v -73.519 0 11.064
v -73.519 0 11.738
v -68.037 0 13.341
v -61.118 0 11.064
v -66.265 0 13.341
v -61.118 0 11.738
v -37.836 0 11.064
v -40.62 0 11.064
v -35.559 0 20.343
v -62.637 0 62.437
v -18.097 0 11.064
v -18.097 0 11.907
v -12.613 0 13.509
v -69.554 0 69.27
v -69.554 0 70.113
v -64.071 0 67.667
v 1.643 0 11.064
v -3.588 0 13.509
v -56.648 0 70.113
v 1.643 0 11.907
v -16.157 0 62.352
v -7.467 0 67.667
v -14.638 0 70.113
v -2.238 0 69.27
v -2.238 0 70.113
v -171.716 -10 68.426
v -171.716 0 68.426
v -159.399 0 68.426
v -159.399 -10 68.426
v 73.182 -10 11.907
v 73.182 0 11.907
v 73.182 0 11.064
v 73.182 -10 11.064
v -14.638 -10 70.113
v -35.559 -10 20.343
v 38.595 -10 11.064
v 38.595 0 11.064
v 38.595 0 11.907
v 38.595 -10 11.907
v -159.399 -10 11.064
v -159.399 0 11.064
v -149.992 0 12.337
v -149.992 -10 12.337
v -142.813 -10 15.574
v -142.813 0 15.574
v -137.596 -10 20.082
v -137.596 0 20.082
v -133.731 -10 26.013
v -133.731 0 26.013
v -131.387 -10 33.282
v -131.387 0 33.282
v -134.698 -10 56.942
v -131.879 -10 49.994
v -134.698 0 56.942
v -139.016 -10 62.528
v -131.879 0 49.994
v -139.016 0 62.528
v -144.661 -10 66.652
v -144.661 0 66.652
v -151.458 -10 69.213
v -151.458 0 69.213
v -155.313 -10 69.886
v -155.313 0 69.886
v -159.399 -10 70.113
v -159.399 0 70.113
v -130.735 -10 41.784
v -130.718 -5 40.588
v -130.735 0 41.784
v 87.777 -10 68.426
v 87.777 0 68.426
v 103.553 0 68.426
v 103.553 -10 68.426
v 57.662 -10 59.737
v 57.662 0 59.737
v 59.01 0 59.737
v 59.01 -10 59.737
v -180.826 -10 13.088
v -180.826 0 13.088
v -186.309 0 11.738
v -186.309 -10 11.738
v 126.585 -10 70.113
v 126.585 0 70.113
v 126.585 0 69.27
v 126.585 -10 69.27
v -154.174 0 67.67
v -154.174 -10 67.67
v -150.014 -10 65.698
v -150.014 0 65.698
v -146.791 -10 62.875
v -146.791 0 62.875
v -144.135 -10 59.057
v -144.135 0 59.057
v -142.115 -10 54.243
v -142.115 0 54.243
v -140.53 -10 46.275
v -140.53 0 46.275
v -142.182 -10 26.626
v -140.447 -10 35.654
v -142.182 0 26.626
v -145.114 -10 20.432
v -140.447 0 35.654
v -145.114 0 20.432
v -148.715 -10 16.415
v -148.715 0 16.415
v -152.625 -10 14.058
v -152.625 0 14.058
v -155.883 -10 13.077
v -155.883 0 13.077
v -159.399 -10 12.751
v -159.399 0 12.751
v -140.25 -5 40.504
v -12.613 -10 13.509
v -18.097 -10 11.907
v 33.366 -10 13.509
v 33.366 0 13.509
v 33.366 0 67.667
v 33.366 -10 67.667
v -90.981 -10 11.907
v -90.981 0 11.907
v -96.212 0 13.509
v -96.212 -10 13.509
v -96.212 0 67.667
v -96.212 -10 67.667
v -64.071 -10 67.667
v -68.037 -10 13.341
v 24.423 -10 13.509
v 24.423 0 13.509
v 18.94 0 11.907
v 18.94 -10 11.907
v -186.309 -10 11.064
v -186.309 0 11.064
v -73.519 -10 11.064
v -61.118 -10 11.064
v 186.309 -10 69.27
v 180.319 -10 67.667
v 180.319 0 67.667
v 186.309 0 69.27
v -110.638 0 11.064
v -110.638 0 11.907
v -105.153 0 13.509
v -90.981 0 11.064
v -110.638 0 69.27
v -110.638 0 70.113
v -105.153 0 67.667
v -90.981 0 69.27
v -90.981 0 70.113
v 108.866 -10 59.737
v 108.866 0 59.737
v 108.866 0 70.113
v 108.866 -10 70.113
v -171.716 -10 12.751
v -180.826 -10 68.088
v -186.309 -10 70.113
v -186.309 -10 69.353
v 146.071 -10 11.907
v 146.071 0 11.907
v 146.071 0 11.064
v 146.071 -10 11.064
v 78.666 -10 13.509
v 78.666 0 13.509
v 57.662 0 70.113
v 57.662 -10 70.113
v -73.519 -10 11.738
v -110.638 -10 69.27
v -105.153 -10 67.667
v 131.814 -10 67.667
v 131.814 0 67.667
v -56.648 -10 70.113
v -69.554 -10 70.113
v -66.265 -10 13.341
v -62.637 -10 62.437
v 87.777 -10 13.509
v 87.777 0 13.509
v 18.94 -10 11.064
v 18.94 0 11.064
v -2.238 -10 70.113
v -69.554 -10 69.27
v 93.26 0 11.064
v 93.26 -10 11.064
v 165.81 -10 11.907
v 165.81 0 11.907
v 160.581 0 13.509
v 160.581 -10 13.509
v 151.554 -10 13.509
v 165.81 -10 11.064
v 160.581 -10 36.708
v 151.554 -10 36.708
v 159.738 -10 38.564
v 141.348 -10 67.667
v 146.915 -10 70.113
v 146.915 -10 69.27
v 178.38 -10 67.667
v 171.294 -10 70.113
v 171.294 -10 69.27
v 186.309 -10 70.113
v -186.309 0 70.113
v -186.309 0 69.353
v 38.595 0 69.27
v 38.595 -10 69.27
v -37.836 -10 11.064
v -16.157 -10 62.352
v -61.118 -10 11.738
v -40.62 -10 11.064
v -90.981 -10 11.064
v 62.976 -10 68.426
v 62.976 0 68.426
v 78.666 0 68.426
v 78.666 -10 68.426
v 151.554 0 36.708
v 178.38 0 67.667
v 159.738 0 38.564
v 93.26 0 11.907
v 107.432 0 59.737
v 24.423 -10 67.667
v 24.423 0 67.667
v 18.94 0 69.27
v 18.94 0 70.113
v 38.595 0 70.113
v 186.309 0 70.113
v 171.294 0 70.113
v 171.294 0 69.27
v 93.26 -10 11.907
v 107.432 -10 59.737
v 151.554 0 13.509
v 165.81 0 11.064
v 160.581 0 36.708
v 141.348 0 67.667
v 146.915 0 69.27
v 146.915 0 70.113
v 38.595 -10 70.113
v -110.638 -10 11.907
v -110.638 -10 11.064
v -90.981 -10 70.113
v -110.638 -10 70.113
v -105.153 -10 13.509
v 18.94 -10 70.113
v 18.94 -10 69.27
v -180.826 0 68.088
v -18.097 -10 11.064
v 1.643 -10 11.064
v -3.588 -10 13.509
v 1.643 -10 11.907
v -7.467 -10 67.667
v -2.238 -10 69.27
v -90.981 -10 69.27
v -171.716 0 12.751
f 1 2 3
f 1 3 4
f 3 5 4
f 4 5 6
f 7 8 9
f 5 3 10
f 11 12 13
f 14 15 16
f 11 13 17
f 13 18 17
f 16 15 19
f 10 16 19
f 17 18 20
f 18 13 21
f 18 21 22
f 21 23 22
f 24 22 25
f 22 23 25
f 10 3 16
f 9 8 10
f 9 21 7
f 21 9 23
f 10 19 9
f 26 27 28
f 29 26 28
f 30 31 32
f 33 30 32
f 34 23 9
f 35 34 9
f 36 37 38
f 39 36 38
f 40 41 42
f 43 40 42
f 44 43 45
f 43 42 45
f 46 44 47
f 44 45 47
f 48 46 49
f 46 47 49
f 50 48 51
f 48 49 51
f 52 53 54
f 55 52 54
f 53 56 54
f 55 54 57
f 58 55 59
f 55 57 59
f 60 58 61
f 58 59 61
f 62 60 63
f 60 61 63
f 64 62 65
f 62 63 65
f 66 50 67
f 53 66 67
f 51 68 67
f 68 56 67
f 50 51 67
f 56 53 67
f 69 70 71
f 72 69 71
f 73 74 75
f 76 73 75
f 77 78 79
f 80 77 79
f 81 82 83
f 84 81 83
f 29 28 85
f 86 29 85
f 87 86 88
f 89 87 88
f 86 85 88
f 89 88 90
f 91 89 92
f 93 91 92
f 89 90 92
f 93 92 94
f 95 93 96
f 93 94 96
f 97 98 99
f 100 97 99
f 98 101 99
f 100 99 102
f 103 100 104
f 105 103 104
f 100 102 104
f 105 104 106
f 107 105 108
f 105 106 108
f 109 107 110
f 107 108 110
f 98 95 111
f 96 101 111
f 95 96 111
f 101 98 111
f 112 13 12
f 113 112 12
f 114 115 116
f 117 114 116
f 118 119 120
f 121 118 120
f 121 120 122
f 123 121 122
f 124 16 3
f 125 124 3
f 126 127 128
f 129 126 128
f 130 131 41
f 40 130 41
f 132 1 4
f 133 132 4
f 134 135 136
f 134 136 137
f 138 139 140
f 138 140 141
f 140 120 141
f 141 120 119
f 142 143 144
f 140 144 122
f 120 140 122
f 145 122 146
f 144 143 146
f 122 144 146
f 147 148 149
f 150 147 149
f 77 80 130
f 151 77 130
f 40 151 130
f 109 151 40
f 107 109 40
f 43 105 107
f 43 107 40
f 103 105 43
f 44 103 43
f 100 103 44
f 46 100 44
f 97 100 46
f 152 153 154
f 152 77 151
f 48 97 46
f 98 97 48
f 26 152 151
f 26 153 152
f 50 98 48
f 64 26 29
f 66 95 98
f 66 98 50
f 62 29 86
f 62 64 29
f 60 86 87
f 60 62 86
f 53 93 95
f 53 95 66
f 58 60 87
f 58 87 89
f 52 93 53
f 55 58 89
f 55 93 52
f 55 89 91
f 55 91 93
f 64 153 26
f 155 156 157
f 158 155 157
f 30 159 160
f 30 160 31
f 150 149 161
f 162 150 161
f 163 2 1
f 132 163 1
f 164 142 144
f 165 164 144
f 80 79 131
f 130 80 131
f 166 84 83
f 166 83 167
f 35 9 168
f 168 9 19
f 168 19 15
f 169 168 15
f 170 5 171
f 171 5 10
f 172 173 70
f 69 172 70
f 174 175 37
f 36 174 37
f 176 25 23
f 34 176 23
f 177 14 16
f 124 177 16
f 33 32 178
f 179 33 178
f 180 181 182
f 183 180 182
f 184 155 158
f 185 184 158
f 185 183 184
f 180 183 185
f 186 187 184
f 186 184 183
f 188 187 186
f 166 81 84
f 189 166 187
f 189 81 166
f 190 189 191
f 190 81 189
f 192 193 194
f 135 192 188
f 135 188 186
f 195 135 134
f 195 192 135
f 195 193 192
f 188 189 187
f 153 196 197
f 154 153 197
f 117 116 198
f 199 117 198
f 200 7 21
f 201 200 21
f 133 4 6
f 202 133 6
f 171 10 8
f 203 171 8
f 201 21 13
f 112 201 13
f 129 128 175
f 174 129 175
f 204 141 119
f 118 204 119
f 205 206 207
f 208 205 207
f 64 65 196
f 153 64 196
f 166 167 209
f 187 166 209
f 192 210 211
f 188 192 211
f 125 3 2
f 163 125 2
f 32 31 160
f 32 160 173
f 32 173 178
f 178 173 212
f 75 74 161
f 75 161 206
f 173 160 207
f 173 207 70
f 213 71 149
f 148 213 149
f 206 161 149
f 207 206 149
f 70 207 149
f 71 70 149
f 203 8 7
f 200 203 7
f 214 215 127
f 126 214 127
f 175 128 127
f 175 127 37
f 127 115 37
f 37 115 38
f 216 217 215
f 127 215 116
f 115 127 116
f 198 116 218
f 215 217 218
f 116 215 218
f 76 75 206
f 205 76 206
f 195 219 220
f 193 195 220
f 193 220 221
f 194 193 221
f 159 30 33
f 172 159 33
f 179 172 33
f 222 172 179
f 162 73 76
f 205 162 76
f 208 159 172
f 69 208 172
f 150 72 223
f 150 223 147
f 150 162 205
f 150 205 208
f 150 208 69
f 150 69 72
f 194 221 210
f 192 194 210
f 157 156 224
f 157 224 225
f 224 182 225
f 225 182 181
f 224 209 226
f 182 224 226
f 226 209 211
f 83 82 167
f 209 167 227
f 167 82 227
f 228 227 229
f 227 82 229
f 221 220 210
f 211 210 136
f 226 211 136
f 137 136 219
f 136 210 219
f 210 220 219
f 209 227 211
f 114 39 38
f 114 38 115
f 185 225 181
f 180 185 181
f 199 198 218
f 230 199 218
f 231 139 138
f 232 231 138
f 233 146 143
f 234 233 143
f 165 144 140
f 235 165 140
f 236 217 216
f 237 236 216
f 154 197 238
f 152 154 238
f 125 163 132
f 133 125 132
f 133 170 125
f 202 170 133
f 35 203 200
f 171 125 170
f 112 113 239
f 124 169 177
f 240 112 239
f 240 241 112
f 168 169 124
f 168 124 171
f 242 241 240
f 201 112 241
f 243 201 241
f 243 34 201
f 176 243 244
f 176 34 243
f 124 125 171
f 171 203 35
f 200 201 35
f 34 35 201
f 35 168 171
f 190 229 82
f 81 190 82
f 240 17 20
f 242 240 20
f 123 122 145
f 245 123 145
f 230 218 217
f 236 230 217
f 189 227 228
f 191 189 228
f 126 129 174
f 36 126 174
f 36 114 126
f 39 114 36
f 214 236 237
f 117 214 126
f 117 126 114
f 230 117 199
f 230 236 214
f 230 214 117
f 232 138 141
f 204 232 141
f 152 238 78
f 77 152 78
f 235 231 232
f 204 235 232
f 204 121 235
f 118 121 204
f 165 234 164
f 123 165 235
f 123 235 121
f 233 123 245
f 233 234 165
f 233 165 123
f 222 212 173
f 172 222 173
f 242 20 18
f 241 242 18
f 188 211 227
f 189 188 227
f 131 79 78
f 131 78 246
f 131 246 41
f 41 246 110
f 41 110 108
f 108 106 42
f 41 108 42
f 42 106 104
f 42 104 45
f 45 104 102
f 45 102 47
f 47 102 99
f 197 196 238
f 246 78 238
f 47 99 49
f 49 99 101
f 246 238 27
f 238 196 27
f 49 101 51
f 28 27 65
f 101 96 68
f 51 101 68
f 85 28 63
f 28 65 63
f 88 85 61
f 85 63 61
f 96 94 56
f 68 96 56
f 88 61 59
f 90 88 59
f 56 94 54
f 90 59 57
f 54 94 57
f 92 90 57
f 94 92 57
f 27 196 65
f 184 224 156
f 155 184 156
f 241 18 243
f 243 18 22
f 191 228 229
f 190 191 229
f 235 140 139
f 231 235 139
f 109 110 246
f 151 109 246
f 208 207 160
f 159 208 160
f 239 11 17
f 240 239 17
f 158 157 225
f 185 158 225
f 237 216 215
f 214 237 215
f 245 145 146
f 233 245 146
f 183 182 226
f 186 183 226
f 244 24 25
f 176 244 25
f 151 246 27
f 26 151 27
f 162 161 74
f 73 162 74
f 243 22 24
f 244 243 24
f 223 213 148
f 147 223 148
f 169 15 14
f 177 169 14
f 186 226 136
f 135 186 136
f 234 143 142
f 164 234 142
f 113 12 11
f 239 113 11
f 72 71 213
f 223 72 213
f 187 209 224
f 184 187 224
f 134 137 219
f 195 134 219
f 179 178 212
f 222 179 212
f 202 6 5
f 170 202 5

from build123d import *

# Parameters (mm, degrees)
F1_DEPTH = 10


with BuildPart() as f1:
    # F0 (on Front) → F1 (new body)
    with BuildSketch(Plane.XZ):
        with BuildLine():
            Line((-159.3991003414, 70.1133744277), (-186.3090163992, 70.1133744277))
            Line((-186.3090163992, 70.1133744277), (-186.3090163992, 69.353283572))
            Line((-186.3090163992, 69.353283572), (-180.8257710277, 68.0881088784))
            Line((-180.8257710277, 68.0881088784), (-180.8257710277, 13.0881088784))
            Line((-180.8257710277, 13.0881088784), (-186.3090163992, 11.7379363154))
            Line((-186.3090163992, 11.7379363154), (-186.3090163992, 11.0640792311))
            Line((-186.3090163992, 11.0640792311), (-159.3991003414, 11.0640792311))
            add(Edge.make_bspline(
                [(-159.3991003414, 11.0640792311), (-142.5276043154, 11.0640792311), (-130.71769879, 22.0293854751), (-130.71769879, 40.5881088784)],
                knots=[0, 0, 0, 0, 1, 1, 1, 1], degree=3))
            add(Edge.make_bspline(
                [(-130.71769879, 40.5881088784), (-130.71769879, 58.978110438), (-142.5276043154, 70.1133744277), (-159.3991003414, 70.1133744277)],
                knots=[0, 0, 0, 0, 1, 1, 1, 1], degree=3))
        make_face()
        with BuildLine():
            Line((-171.7157725872, 12.75056909), (-171.7157725872, 68.4256553716))
            Line((-171.7157725872, 68.4256553716), (-159.3991003414, 68.4256553716))
            add(Edge.make_bspline(
                [(-159.3991003414, 68.4256553716), (-148.2633916058, 68.4256553716), (-140.250243828, 59.1466378451), (-140.250243828, 40.5043402061)],
                knots=[0, 0, 0, 0, 1, 1, 1, 1], degree=3))
            add(Edge.make_bspline(
                [(-140.250243828, 40.5043402061), (-140.250243828, 21.9456168028), (-148.2633916058, 12.75056909), (-159.3991003414, 12.75056909)],
                knots=[0, 0, 0, 0, 1, 1, 1, 1], degree=3))
            Line((-159.3991003414, 12.75056909), (-171.7157725872, 12.75056909))
        make_face(mode=Mode.SUBTRACT)
    extrude(amount=F1_DEPTH)


with BuildPart() as f1b:
    # F0 (on Front) → F1, piece 2 (new body)
    with BuildSketch(Plane.XZ):
        Polygon((-90.98110539, 70.1133744277), (-110.6375130752, 70.1133744277), (-110.6375130752, 69.2695148996), (-105.1530362715, 67.666793713), (-105.1530362715, 13.5094240439), (-110.6375130752, 11.906709562), (-110.6375130752, 11.0640792311), (-90.98110539, 11.0640792311), (-90.98110539, 11.906709562), (-96.2118043729, 13.5094240439), (-96.2118043729, 67.666793713), (-90.98110539, 69.2695148996), align=None)
    extrude(amount=F1_DEPTH)


with BuildPart() as f1c:
    # F0 (on Front) → F1, piece 3 (new body)
    with BuildSketch(Plane.XZ):
        Polygon((-56.6476807507, 70.1133744277), (-69.5544347038, 70.1133744277), (-69.5544347038, 69.2695148996), (-64.0711893322, 67.666793713), (-68.0367180914, 13.3406507973), (-73.5187342658, 11.7379363154), (-73.5187342658, 11.0640792311), (-61.1182933476, 11.0640792311), (-61.1182933476, 11.7379363154), (-66.265228128, 13.3406507973), (-62.637245862, 62.4373239273), (-40.6204934684, 11.0640792311), (-37.8363640257, 11.0640792311), (-16.1571581253, 62.3523193531), (-12.6129445316, 13.5094240439), (-18.0974191003, 11.906709562), (-18.0974191003, 11.0640792311), (1.6427550223, 11.0640792311), (1.6427550223, 11.906709562), (-3.5879506653, 13.5094240439), (-7.4672434182, 67.666793713), (-2.2377691627, 69.2695148996), (-2.2377691627, 70.1133744277), (-14.6382100808, 70.1133744277), (-35.5585632623, 20.3428509181), align=None)
    extrude(amount=F1_DEPTH)


with BuildPart() as f1d:
    # F0 (on Front) → F1, piece 4 (new body)
    with BuildSketch(Plane.XZ):
        Polygon((38.5952256843, 70.1133744277), (18.9400494312, 70.1133744277), (18.9400494312, 69.2695148996), (24.4232948028, 67.666793713), (24.4232948028, 13.5094240439), (18.9400494312, 11.906709562), (18.9400494312, 11.0640792311), (38.5952256843, 11.0640792311), (38.5952256843, 11.906709562), (33.3657581335, 13.5094240439), (33.3657581335, 67.666793713), (38.5952256843, 69.2695148996), align=None)
    extrude(amount=F1_DEPTH)


with BuildPart() as f1e:
    # F0 (on Front) → F1, piece 5 (new body)
    with BuildSketch(Plane.XZ):
        Polygon((108.8660231118, 70.1133744277), (57.6615494273, 70.1133744277), (57.6615494273, 59.7369720966), (59.0104927931, 59.7369720966), (62.9760215523, 68.4256553716), (78.6656690461, 68.4256553716), (78.6656690461, 13.5094240439), (73.1824236746, 11.906709562), (73.1824236746, 11.0640792311), (93.2601442903, 11.0640792311), (93.2601442903, 11.906709562), (87.7768989187, 13.5094240439), (87.7768989187, 68.4256553716), (103.552780184, 68.4256553716), (107.4320751718, 59.7369720966), (108.8660231118, 59.7369720966), align=None)
    extrude(amount=F1_DEPTH)


with BuildPart() as f1f:
    # F0 (on Front) → F1, piece 6 (new body)
    with BuildSketch(Plane.XZ):
        Polygon((146.9148952208, 70.1133744277), (126.5846259815, 70.1133744277), (126.5846259815, 69.2695148996), (131.814100237, 67.666793713), (151.5542765945, 36.7075846935), (151.5542765945, 13.5094240439), (146.0710356927, 11.906709562), (146.0710356927, 11.0640792311), (165.8099806181, 11.0640792311), (165.8099806181, 11.906709562), (160.5805063626, 13.5094240439), (160.5805063626, 36.7075846935), (180.319451288, 67.666793713), (186.3090163992, 69.2695148996), (186.3090163992, 70.1133744277), (171.2944574218, 70.1133744277), (171.2944574218, 69.2695148996), (178.3804172753, 67.666793713), (159.7378760317, 38.5640769962), (141.3478744722, 67.666793713), (146.9148952208, 69.2695148996), align=None)
    extrude(amount=F1_DEPTH)


solid = Compound([f1.part, f1b.part, f1c.part, f1d.part, f1e.part, f1f.part])
